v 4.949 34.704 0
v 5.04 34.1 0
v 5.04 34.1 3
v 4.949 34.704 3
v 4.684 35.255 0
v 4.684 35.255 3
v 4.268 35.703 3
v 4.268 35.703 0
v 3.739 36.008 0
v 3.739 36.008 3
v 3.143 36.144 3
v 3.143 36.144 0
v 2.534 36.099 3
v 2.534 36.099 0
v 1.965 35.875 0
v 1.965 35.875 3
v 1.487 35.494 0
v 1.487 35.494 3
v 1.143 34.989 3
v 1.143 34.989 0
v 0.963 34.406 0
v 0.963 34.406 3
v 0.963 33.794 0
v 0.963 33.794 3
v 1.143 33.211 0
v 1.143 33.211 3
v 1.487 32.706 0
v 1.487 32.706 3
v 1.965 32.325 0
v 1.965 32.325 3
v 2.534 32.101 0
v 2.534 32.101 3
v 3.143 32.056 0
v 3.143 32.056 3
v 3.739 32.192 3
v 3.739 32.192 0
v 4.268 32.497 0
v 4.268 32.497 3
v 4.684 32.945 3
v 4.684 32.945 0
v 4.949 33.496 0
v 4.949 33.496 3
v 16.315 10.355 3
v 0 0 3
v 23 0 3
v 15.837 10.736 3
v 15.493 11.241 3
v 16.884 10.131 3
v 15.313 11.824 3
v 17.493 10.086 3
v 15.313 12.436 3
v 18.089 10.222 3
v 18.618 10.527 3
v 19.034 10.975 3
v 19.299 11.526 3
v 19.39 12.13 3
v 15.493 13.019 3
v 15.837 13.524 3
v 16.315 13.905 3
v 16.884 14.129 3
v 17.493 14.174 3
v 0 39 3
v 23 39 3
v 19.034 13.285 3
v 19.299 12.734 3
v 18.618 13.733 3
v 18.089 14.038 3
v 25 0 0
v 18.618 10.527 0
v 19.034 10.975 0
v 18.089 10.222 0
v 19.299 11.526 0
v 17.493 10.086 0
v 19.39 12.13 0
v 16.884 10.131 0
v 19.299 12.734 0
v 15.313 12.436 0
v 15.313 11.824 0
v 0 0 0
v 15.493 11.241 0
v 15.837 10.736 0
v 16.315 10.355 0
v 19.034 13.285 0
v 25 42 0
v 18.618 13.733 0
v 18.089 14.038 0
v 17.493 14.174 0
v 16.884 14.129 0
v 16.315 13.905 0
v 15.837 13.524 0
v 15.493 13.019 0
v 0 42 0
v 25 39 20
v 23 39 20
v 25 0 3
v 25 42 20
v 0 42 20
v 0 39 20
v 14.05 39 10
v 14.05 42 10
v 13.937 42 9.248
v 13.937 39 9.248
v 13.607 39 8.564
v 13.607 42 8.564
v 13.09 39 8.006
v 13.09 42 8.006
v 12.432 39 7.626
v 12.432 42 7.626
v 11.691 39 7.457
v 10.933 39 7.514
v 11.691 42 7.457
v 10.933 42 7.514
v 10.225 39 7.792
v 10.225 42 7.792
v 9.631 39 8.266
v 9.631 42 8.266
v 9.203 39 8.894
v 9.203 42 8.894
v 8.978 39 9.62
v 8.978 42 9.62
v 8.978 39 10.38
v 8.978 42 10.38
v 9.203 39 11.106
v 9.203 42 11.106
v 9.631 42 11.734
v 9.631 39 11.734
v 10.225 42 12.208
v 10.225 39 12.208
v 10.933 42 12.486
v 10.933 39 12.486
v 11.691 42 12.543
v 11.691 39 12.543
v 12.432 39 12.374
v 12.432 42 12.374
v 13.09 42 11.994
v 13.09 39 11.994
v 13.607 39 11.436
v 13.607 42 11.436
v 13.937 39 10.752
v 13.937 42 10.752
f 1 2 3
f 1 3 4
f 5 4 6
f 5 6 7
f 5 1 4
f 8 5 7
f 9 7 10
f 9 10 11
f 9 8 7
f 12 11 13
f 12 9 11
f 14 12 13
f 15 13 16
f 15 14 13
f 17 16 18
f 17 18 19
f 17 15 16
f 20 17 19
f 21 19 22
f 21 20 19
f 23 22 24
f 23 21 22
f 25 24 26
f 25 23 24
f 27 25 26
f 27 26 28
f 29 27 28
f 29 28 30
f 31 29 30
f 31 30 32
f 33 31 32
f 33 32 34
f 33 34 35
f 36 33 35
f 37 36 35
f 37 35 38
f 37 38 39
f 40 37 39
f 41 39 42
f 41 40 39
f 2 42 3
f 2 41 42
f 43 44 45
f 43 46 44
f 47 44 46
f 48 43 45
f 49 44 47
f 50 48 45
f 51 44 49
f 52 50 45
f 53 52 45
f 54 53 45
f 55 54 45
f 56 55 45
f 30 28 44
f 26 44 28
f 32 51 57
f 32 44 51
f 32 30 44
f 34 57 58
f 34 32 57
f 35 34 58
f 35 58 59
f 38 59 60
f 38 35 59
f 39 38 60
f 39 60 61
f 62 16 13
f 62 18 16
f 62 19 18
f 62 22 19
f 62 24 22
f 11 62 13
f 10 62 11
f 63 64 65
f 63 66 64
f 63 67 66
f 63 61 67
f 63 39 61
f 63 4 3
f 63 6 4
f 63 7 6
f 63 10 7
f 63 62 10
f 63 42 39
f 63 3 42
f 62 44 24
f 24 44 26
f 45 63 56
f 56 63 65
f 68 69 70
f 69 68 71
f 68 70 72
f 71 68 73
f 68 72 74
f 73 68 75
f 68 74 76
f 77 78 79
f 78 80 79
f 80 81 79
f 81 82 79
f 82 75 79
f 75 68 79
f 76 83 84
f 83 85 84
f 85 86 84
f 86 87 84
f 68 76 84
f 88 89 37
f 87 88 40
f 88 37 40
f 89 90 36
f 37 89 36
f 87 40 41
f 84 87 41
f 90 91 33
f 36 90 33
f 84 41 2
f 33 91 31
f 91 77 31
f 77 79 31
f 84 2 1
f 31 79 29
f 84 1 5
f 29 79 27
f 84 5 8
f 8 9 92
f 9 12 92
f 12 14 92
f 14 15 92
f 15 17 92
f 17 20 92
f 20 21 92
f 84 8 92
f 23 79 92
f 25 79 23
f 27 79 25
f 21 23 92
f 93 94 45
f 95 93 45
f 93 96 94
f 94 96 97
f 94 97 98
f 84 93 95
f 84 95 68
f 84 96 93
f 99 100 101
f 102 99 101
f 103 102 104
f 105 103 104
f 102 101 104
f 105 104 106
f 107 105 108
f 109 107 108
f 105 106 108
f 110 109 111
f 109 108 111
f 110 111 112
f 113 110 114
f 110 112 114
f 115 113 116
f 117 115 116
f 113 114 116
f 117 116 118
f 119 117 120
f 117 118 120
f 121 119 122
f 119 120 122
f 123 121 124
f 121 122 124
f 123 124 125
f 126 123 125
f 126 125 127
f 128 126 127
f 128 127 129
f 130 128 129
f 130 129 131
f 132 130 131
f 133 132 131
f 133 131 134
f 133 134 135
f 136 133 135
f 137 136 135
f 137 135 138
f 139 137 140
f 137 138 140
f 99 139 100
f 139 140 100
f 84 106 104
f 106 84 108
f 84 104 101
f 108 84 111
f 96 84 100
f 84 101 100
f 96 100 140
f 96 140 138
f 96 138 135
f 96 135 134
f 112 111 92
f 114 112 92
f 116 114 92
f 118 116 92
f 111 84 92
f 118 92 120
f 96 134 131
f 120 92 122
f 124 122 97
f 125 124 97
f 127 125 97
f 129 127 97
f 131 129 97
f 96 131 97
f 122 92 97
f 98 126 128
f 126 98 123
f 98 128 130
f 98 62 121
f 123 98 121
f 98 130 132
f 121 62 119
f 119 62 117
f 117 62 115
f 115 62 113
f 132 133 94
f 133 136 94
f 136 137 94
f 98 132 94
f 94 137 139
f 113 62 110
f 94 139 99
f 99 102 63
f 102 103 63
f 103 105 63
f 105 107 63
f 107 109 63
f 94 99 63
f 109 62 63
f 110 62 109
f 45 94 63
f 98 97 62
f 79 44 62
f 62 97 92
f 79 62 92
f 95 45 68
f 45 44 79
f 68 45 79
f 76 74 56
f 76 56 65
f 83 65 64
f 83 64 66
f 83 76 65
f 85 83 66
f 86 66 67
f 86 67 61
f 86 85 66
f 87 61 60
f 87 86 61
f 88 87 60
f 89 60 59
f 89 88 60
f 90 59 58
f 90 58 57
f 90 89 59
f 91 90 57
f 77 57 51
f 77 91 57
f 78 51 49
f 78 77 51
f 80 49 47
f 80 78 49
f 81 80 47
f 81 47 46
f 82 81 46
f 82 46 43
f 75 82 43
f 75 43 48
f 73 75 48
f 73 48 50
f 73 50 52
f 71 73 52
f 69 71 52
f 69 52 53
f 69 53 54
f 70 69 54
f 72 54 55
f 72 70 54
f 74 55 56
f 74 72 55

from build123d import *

# Parameters (mm, degrees)
SKETCH1_W           = 23
SKETCH1_H           = 42.000000074
SKETCH1_R           = 2.05
BOSS_EXTRUDE1_DEPTH = 3
SKETCH2_W           = 23
SKETCH2_H           = 17
SKETCH2_R           = 2.55
BOSS_EXTRUDE2_DEPTH = 3
BOSS_EXTRUDE3_DEPTH = 2


with BuildPart() as part:
    # Sketch1 → Boss-Extrude1 (new body)
    with BuildSketch(Plane.XY):
        with Locations((11.5, 21.000000037)):
            Rectangle(SKETCH1_W, SKETCH1_H)
        with Locations((17.34, 12.13)):
            Circle(SKETCH1_R, mode=Mode.SUBTRACT)
        with Locations((2.99, 34.1)):
            Circle(SKETCH1_R, mode=Mode.SUBTRACT)
    extrude(amount=BOSS_EXTRUDE1_DEPTH)

    # Sketch2 → Boss-Extrude2 (add)
    with BuildSketch(Plane(origin=(0, 42.000000074, 0), x_dir=(1, 0, 0), z_dir=(0, 1, 0))):
        with Locations((11.5, -11.5)):
            Rectangle(SKETCH2_W, SKETCH2_H)
        with Locations((11.5, -10)):
            Circle(SKETCH2_R, mode=Mode.SUBTRACT)
    extrude(amount=-BOSS_EXTRUDE2_DEPTH)

    # Sketch3 → Boss-Extrude3 (add)
    with BuildSketch(Plane(origin=(23, 0, 0), x_dir=(0, 0, -1), z_dir=(1, 0, 0))):
        Polygon((-20, 39.000000074), (-3, 0), (0, 0), (0, 42.000000074), (-20, 42.000000074), align=None)
    extrude(amount=BOSS_EXTRUDE3_DEPTH)


solid = part.part
